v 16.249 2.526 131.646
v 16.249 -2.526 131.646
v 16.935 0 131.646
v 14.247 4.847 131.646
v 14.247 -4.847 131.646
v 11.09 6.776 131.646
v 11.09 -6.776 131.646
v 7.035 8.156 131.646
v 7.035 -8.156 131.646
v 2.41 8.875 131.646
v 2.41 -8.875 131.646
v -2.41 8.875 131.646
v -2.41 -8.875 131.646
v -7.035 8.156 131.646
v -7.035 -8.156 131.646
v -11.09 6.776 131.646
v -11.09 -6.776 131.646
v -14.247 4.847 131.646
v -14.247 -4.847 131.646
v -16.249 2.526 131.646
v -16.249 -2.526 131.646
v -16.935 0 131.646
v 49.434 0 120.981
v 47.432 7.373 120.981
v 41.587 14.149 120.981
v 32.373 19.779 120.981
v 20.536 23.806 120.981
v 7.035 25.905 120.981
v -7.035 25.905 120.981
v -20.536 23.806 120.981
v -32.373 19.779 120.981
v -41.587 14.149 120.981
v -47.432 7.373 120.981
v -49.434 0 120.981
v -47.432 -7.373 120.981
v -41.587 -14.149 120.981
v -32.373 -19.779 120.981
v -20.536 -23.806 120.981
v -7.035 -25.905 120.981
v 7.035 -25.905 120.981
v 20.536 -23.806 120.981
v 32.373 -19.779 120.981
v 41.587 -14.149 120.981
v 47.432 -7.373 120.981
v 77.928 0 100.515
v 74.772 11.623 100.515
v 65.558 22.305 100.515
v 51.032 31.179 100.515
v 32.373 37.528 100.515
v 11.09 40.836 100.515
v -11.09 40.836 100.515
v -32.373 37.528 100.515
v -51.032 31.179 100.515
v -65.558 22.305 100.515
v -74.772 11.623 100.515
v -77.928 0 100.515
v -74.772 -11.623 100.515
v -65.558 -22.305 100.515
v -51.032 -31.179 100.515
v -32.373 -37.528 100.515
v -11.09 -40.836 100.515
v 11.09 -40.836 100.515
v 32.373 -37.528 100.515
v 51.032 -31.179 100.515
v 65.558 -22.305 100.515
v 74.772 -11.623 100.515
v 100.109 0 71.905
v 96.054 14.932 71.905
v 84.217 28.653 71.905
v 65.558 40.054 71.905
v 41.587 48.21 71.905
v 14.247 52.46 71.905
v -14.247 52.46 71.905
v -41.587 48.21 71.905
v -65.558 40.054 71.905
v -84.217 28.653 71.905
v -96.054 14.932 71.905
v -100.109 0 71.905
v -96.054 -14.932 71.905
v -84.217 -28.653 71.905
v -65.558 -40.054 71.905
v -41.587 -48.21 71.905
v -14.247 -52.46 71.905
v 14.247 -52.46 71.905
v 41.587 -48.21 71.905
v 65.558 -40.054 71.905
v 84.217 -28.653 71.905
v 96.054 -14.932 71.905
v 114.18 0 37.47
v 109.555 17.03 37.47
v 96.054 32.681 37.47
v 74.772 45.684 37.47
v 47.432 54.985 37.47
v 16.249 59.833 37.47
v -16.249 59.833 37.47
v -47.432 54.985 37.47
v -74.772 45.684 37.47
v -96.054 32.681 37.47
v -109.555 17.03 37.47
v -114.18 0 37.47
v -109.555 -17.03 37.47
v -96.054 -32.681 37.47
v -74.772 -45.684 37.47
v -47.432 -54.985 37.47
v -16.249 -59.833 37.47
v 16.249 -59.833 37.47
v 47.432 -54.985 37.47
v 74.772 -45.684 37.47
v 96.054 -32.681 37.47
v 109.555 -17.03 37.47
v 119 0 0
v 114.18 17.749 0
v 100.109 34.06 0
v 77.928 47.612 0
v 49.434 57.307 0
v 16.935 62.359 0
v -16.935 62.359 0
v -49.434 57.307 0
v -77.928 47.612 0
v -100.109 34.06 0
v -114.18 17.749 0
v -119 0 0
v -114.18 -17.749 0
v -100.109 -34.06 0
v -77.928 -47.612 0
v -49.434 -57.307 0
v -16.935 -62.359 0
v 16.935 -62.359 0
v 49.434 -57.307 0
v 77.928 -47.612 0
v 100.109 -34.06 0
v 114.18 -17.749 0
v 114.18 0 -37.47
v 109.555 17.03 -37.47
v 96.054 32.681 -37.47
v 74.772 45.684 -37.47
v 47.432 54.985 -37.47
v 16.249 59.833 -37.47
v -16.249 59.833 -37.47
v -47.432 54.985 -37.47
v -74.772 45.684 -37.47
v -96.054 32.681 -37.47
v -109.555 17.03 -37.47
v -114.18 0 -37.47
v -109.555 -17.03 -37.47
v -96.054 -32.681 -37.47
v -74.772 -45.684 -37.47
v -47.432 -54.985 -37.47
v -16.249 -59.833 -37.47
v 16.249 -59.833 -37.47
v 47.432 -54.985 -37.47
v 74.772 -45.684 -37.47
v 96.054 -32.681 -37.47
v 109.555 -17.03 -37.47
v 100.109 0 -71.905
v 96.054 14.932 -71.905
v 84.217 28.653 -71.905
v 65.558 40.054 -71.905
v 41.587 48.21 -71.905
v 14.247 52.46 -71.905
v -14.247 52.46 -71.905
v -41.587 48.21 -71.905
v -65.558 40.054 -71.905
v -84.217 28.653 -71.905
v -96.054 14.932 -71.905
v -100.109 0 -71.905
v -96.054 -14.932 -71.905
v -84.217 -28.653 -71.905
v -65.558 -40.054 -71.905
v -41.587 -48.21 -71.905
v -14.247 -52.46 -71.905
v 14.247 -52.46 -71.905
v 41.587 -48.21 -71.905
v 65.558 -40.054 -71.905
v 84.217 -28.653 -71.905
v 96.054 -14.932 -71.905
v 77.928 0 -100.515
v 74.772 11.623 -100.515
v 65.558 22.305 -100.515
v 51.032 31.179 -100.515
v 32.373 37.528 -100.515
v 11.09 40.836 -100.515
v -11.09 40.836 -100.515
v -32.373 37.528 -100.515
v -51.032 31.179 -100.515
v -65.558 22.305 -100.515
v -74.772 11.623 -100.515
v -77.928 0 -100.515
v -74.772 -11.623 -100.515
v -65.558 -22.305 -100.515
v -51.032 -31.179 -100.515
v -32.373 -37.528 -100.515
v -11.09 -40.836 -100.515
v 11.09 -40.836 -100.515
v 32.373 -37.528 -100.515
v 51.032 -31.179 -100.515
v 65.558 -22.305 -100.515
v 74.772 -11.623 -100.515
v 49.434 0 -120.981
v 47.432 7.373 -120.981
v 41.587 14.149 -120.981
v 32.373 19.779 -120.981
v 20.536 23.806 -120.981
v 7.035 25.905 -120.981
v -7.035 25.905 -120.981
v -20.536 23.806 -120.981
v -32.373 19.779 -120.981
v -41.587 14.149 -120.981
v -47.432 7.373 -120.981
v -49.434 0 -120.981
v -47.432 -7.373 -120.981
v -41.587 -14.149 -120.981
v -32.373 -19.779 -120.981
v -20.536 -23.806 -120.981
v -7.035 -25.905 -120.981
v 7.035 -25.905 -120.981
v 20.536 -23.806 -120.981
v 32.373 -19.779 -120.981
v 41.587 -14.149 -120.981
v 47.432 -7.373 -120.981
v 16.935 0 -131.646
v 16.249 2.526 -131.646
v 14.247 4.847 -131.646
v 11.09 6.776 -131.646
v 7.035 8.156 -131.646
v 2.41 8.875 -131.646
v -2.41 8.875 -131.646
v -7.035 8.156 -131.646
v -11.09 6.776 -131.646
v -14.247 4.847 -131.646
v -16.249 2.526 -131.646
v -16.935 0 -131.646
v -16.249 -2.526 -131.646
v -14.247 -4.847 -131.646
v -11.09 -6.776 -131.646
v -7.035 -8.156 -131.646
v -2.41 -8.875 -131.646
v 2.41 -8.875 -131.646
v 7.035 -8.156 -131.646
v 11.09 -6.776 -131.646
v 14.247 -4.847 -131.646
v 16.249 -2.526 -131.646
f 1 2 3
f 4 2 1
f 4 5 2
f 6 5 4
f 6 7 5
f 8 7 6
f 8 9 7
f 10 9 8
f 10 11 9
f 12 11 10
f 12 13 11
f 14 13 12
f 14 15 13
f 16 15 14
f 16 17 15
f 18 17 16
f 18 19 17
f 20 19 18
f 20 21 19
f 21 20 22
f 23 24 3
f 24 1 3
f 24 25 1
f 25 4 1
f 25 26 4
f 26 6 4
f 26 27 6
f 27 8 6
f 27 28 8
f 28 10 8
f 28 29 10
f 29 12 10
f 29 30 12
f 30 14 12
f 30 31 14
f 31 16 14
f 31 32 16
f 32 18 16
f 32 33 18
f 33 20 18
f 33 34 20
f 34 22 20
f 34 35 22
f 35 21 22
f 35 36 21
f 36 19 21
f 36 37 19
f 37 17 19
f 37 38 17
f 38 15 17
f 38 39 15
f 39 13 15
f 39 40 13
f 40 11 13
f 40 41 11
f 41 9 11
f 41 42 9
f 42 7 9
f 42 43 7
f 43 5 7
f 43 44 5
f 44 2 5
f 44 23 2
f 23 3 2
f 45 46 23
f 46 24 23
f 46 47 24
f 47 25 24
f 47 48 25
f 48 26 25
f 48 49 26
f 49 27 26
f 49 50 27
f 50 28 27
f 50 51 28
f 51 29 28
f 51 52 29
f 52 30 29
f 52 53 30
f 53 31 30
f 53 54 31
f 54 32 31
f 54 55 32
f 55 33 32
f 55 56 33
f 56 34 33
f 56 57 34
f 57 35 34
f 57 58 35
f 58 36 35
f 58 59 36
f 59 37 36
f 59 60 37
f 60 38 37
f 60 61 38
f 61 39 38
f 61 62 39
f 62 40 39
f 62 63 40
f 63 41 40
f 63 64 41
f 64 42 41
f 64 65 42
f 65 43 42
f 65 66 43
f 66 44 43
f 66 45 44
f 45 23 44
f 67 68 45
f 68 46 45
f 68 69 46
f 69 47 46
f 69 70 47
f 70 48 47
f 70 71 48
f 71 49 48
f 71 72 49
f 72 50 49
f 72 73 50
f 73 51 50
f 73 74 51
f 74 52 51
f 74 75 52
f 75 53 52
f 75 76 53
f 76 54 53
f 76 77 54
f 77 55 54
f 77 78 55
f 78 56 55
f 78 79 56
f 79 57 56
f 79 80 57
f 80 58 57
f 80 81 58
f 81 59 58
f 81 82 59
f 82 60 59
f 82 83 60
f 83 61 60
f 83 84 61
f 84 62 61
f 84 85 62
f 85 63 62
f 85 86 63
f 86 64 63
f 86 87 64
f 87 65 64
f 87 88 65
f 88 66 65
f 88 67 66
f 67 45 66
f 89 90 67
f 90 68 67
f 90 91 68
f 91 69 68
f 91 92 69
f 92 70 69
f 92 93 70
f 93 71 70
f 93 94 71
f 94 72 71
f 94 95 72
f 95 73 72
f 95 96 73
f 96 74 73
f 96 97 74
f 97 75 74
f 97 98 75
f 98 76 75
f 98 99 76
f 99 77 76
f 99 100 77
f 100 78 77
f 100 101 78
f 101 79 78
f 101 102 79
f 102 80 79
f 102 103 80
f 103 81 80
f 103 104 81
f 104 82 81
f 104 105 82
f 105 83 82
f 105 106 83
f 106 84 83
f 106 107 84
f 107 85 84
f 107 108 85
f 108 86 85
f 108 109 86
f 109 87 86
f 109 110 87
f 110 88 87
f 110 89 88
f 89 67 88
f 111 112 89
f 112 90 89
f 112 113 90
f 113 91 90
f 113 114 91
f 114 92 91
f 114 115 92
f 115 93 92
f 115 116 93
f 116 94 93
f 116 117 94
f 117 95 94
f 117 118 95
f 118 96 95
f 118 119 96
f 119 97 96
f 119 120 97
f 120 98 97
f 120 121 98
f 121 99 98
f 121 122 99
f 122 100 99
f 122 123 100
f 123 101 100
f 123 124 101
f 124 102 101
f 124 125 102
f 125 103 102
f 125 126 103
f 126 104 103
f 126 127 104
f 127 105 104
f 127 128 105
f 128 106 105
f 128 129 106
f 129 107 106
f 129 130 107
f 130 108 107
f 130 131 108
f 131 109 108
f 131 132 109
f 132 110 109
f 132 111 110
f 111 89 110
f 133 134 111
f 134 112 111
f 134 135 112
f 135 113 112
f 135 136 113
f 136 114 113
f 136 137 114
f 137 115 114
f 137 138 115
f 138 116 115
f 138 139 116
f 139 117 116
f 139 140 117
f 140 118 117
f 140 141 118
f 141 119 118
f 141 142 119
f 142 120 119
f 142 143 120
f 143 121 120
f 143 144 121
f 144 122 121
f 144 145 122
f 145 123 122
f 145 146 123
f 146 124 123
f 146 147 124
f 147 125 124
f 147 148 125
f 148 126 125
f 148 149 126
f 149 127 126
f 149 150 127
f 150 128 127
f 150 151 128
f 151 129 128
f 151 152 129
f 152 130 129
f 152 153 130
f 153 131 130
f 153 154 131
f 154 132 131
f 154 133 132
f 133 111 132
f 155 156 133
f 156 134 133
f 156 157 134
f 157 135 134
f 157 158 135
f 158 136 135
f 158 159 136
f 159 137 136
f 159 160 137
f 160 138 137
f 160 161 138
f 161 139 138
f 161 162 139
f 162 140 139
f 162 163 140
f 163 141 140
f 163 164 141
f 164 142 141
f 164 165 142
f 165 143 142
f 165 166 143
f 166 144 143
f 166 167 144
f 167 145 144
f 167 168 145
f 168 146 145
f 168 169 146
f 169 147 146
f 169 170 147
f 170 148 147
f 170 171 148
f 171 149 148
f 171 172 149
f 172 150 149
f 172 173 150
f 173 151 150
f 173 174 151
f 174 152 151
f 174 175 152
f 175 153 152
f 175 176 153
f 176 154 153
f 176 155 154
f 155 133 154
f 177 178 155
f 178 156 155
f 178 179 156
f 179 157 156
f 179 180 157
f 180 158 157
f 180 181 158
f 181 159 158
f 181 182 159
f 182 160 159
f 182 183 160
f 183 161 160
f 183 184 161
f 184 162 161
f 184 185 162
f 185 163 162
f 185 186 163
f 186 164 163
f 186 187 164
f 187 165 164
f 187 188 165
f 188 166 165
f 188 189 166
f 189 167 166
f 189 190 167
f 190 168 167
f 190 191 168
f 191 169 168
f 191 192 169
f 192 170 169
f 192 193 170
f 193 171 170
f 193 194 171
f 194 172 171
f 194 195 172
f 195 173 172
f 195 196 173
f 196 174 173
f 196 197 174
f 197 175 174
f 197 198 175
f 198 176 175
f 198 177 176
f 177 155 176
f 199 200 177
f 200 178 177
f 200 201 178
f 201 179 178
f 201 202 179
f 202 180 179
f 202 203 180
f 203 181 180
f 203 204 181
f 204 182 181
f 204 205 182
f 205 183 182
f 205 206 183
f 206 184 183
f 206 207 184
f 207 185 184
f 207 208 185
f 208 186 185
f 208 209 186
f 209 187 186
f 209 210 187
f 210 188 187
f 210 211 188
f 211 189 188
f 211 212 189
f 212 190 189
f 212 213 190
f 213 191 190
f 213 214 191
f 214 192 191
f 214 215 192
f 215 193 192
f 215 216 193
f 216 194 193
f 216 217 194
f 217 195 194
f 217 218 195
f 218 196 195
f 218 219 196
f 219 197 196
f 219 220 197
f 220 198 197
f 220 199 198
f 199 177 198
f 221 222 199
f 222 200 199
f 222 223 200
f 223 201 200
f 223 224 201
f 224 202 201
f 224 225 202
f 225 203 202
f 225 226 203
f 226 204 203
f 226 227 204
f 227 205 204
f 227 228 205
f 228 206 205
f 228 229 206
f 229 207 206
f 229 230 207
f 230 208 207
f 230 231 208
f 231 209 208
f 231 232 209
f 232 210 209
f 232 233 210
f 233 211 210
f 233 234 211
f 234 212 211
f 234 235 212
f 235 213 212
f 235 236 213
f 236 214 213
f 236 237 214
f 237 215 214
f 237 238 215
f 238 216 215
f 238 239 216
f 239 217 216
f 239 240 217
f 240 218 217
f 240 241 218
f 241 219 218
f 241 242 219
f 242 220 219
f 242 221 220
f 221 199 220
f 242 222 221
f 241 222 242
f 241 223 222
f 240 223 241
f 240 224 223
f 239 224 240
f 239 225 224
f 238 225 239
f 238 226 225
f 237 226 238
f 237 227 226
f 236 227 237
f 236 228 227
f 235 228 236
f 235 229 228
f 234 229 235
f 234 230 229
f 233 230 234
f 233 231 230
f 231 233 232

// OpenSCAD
// Generated by SolidPython 1.0.1 on 2020-07-29 00:46:53


scale(v = [17, 9, 19]) {
	sphere(r = 7);
}
/***********************************************
*********      SolidPython code:      **********
************************************************
 
# import packages: SolidPython
from solid import *
from solid.utils import *
from itertools import chain, combinations, permutations


class Resize:

    def __init__(self, scad_file):
        self.scad_file = scad_file
        #self.scad_file = import_scad(scad_file)
        # cone/cylinder param:
        self.r1 = 0
        self.r2 = 0
        self.h = 0
        # rectangular prism param:
        self.w = 0
        self.l = 0
        # ellipse param:
        self.r = 0

    # import OpenScad code (file name corresponds to shape)


    # classify shape + parameters
    def assign(self, param1, param2, param3):
        if self.scad_file == 'cone.scad':
            self.r1 = param1
            self.r2 = param2
            self.h = param3
        elif self.scad_file == 'cylinder.scad':
            self.r1 = param1
            self.r2 = param2
            self.h = param3
        elif self.scad_file == 'rectangularPrism.scad':
            self.h = param1
            self.l = param2
            self.w = param3
        else:
            self.r = param1
            self.h = param2

    # resize parameters
    def iterate(self):
        x = range(3, 20, 2)
        i = 1
        if self.scad_file == 'cone.scad':
            tempList = list(permutations(x, 2))
            for temp in tempList:
                param1 = temp[0]
                param2 = temp[1]
                filepath = 'produced_scad_files/' + 'cone' + str(param1) + '_' + str(param2) + '_' + '.scad'
                scad_render_to_file(cylinder(h=param1, r1=param2, r2=0), filepath)

        elif self.scad_file == 'cylinder.scad':
            tempList = list(permutations(x, 3))
            for temp in tempList:
                param1 = temp[0]
                param2 = temp[1]
                filepath = 'produced_scad_files/' + 'cylinder' + str(param1) + '_' + str(param2) + '_' + '.scad'
                scad_render_to_file(cylinder(h=param1, r1=param2, r2=param2), filepath)

        elif self.scad_file == 'rectangularPrism.scad':
            tempList = list(permutations(x, 3))
            for temp in tempList:
                param1 = temp[0]
                param2 = temp[1]
                param3 = temp[2]
                filepath = 'produced_scad_files/' + 'rectangularPrism' + str(param1) + '_' + str(param2) + '_' + str(
                    param3) + '.scad'
                scad_render_to_file(cube(size=(param1, param2, param3)), filepath)

        elif self.scad_file == 'ellipse.scad':
            tempList = list(permutations(x, 4))
            for temp in tempList:
                param1 = temp[0]
                param2 = temp[1]
                param3 = temp[2]
                param4 = temp[3]
                filepath = 'produced_scad_files/' + 'ellipse' + str(param1) + '_' + str(param2) + '_' + str(param3) + '_' + str(param4) + '.scad'
                scad_render_to_file(scale([param1, param2, param3])(sphere(r=param4)), filepath)

    def render_to_scadfile(self):
        scad_render_to_file(scad, 'example.scad') 
 
************************************************/
